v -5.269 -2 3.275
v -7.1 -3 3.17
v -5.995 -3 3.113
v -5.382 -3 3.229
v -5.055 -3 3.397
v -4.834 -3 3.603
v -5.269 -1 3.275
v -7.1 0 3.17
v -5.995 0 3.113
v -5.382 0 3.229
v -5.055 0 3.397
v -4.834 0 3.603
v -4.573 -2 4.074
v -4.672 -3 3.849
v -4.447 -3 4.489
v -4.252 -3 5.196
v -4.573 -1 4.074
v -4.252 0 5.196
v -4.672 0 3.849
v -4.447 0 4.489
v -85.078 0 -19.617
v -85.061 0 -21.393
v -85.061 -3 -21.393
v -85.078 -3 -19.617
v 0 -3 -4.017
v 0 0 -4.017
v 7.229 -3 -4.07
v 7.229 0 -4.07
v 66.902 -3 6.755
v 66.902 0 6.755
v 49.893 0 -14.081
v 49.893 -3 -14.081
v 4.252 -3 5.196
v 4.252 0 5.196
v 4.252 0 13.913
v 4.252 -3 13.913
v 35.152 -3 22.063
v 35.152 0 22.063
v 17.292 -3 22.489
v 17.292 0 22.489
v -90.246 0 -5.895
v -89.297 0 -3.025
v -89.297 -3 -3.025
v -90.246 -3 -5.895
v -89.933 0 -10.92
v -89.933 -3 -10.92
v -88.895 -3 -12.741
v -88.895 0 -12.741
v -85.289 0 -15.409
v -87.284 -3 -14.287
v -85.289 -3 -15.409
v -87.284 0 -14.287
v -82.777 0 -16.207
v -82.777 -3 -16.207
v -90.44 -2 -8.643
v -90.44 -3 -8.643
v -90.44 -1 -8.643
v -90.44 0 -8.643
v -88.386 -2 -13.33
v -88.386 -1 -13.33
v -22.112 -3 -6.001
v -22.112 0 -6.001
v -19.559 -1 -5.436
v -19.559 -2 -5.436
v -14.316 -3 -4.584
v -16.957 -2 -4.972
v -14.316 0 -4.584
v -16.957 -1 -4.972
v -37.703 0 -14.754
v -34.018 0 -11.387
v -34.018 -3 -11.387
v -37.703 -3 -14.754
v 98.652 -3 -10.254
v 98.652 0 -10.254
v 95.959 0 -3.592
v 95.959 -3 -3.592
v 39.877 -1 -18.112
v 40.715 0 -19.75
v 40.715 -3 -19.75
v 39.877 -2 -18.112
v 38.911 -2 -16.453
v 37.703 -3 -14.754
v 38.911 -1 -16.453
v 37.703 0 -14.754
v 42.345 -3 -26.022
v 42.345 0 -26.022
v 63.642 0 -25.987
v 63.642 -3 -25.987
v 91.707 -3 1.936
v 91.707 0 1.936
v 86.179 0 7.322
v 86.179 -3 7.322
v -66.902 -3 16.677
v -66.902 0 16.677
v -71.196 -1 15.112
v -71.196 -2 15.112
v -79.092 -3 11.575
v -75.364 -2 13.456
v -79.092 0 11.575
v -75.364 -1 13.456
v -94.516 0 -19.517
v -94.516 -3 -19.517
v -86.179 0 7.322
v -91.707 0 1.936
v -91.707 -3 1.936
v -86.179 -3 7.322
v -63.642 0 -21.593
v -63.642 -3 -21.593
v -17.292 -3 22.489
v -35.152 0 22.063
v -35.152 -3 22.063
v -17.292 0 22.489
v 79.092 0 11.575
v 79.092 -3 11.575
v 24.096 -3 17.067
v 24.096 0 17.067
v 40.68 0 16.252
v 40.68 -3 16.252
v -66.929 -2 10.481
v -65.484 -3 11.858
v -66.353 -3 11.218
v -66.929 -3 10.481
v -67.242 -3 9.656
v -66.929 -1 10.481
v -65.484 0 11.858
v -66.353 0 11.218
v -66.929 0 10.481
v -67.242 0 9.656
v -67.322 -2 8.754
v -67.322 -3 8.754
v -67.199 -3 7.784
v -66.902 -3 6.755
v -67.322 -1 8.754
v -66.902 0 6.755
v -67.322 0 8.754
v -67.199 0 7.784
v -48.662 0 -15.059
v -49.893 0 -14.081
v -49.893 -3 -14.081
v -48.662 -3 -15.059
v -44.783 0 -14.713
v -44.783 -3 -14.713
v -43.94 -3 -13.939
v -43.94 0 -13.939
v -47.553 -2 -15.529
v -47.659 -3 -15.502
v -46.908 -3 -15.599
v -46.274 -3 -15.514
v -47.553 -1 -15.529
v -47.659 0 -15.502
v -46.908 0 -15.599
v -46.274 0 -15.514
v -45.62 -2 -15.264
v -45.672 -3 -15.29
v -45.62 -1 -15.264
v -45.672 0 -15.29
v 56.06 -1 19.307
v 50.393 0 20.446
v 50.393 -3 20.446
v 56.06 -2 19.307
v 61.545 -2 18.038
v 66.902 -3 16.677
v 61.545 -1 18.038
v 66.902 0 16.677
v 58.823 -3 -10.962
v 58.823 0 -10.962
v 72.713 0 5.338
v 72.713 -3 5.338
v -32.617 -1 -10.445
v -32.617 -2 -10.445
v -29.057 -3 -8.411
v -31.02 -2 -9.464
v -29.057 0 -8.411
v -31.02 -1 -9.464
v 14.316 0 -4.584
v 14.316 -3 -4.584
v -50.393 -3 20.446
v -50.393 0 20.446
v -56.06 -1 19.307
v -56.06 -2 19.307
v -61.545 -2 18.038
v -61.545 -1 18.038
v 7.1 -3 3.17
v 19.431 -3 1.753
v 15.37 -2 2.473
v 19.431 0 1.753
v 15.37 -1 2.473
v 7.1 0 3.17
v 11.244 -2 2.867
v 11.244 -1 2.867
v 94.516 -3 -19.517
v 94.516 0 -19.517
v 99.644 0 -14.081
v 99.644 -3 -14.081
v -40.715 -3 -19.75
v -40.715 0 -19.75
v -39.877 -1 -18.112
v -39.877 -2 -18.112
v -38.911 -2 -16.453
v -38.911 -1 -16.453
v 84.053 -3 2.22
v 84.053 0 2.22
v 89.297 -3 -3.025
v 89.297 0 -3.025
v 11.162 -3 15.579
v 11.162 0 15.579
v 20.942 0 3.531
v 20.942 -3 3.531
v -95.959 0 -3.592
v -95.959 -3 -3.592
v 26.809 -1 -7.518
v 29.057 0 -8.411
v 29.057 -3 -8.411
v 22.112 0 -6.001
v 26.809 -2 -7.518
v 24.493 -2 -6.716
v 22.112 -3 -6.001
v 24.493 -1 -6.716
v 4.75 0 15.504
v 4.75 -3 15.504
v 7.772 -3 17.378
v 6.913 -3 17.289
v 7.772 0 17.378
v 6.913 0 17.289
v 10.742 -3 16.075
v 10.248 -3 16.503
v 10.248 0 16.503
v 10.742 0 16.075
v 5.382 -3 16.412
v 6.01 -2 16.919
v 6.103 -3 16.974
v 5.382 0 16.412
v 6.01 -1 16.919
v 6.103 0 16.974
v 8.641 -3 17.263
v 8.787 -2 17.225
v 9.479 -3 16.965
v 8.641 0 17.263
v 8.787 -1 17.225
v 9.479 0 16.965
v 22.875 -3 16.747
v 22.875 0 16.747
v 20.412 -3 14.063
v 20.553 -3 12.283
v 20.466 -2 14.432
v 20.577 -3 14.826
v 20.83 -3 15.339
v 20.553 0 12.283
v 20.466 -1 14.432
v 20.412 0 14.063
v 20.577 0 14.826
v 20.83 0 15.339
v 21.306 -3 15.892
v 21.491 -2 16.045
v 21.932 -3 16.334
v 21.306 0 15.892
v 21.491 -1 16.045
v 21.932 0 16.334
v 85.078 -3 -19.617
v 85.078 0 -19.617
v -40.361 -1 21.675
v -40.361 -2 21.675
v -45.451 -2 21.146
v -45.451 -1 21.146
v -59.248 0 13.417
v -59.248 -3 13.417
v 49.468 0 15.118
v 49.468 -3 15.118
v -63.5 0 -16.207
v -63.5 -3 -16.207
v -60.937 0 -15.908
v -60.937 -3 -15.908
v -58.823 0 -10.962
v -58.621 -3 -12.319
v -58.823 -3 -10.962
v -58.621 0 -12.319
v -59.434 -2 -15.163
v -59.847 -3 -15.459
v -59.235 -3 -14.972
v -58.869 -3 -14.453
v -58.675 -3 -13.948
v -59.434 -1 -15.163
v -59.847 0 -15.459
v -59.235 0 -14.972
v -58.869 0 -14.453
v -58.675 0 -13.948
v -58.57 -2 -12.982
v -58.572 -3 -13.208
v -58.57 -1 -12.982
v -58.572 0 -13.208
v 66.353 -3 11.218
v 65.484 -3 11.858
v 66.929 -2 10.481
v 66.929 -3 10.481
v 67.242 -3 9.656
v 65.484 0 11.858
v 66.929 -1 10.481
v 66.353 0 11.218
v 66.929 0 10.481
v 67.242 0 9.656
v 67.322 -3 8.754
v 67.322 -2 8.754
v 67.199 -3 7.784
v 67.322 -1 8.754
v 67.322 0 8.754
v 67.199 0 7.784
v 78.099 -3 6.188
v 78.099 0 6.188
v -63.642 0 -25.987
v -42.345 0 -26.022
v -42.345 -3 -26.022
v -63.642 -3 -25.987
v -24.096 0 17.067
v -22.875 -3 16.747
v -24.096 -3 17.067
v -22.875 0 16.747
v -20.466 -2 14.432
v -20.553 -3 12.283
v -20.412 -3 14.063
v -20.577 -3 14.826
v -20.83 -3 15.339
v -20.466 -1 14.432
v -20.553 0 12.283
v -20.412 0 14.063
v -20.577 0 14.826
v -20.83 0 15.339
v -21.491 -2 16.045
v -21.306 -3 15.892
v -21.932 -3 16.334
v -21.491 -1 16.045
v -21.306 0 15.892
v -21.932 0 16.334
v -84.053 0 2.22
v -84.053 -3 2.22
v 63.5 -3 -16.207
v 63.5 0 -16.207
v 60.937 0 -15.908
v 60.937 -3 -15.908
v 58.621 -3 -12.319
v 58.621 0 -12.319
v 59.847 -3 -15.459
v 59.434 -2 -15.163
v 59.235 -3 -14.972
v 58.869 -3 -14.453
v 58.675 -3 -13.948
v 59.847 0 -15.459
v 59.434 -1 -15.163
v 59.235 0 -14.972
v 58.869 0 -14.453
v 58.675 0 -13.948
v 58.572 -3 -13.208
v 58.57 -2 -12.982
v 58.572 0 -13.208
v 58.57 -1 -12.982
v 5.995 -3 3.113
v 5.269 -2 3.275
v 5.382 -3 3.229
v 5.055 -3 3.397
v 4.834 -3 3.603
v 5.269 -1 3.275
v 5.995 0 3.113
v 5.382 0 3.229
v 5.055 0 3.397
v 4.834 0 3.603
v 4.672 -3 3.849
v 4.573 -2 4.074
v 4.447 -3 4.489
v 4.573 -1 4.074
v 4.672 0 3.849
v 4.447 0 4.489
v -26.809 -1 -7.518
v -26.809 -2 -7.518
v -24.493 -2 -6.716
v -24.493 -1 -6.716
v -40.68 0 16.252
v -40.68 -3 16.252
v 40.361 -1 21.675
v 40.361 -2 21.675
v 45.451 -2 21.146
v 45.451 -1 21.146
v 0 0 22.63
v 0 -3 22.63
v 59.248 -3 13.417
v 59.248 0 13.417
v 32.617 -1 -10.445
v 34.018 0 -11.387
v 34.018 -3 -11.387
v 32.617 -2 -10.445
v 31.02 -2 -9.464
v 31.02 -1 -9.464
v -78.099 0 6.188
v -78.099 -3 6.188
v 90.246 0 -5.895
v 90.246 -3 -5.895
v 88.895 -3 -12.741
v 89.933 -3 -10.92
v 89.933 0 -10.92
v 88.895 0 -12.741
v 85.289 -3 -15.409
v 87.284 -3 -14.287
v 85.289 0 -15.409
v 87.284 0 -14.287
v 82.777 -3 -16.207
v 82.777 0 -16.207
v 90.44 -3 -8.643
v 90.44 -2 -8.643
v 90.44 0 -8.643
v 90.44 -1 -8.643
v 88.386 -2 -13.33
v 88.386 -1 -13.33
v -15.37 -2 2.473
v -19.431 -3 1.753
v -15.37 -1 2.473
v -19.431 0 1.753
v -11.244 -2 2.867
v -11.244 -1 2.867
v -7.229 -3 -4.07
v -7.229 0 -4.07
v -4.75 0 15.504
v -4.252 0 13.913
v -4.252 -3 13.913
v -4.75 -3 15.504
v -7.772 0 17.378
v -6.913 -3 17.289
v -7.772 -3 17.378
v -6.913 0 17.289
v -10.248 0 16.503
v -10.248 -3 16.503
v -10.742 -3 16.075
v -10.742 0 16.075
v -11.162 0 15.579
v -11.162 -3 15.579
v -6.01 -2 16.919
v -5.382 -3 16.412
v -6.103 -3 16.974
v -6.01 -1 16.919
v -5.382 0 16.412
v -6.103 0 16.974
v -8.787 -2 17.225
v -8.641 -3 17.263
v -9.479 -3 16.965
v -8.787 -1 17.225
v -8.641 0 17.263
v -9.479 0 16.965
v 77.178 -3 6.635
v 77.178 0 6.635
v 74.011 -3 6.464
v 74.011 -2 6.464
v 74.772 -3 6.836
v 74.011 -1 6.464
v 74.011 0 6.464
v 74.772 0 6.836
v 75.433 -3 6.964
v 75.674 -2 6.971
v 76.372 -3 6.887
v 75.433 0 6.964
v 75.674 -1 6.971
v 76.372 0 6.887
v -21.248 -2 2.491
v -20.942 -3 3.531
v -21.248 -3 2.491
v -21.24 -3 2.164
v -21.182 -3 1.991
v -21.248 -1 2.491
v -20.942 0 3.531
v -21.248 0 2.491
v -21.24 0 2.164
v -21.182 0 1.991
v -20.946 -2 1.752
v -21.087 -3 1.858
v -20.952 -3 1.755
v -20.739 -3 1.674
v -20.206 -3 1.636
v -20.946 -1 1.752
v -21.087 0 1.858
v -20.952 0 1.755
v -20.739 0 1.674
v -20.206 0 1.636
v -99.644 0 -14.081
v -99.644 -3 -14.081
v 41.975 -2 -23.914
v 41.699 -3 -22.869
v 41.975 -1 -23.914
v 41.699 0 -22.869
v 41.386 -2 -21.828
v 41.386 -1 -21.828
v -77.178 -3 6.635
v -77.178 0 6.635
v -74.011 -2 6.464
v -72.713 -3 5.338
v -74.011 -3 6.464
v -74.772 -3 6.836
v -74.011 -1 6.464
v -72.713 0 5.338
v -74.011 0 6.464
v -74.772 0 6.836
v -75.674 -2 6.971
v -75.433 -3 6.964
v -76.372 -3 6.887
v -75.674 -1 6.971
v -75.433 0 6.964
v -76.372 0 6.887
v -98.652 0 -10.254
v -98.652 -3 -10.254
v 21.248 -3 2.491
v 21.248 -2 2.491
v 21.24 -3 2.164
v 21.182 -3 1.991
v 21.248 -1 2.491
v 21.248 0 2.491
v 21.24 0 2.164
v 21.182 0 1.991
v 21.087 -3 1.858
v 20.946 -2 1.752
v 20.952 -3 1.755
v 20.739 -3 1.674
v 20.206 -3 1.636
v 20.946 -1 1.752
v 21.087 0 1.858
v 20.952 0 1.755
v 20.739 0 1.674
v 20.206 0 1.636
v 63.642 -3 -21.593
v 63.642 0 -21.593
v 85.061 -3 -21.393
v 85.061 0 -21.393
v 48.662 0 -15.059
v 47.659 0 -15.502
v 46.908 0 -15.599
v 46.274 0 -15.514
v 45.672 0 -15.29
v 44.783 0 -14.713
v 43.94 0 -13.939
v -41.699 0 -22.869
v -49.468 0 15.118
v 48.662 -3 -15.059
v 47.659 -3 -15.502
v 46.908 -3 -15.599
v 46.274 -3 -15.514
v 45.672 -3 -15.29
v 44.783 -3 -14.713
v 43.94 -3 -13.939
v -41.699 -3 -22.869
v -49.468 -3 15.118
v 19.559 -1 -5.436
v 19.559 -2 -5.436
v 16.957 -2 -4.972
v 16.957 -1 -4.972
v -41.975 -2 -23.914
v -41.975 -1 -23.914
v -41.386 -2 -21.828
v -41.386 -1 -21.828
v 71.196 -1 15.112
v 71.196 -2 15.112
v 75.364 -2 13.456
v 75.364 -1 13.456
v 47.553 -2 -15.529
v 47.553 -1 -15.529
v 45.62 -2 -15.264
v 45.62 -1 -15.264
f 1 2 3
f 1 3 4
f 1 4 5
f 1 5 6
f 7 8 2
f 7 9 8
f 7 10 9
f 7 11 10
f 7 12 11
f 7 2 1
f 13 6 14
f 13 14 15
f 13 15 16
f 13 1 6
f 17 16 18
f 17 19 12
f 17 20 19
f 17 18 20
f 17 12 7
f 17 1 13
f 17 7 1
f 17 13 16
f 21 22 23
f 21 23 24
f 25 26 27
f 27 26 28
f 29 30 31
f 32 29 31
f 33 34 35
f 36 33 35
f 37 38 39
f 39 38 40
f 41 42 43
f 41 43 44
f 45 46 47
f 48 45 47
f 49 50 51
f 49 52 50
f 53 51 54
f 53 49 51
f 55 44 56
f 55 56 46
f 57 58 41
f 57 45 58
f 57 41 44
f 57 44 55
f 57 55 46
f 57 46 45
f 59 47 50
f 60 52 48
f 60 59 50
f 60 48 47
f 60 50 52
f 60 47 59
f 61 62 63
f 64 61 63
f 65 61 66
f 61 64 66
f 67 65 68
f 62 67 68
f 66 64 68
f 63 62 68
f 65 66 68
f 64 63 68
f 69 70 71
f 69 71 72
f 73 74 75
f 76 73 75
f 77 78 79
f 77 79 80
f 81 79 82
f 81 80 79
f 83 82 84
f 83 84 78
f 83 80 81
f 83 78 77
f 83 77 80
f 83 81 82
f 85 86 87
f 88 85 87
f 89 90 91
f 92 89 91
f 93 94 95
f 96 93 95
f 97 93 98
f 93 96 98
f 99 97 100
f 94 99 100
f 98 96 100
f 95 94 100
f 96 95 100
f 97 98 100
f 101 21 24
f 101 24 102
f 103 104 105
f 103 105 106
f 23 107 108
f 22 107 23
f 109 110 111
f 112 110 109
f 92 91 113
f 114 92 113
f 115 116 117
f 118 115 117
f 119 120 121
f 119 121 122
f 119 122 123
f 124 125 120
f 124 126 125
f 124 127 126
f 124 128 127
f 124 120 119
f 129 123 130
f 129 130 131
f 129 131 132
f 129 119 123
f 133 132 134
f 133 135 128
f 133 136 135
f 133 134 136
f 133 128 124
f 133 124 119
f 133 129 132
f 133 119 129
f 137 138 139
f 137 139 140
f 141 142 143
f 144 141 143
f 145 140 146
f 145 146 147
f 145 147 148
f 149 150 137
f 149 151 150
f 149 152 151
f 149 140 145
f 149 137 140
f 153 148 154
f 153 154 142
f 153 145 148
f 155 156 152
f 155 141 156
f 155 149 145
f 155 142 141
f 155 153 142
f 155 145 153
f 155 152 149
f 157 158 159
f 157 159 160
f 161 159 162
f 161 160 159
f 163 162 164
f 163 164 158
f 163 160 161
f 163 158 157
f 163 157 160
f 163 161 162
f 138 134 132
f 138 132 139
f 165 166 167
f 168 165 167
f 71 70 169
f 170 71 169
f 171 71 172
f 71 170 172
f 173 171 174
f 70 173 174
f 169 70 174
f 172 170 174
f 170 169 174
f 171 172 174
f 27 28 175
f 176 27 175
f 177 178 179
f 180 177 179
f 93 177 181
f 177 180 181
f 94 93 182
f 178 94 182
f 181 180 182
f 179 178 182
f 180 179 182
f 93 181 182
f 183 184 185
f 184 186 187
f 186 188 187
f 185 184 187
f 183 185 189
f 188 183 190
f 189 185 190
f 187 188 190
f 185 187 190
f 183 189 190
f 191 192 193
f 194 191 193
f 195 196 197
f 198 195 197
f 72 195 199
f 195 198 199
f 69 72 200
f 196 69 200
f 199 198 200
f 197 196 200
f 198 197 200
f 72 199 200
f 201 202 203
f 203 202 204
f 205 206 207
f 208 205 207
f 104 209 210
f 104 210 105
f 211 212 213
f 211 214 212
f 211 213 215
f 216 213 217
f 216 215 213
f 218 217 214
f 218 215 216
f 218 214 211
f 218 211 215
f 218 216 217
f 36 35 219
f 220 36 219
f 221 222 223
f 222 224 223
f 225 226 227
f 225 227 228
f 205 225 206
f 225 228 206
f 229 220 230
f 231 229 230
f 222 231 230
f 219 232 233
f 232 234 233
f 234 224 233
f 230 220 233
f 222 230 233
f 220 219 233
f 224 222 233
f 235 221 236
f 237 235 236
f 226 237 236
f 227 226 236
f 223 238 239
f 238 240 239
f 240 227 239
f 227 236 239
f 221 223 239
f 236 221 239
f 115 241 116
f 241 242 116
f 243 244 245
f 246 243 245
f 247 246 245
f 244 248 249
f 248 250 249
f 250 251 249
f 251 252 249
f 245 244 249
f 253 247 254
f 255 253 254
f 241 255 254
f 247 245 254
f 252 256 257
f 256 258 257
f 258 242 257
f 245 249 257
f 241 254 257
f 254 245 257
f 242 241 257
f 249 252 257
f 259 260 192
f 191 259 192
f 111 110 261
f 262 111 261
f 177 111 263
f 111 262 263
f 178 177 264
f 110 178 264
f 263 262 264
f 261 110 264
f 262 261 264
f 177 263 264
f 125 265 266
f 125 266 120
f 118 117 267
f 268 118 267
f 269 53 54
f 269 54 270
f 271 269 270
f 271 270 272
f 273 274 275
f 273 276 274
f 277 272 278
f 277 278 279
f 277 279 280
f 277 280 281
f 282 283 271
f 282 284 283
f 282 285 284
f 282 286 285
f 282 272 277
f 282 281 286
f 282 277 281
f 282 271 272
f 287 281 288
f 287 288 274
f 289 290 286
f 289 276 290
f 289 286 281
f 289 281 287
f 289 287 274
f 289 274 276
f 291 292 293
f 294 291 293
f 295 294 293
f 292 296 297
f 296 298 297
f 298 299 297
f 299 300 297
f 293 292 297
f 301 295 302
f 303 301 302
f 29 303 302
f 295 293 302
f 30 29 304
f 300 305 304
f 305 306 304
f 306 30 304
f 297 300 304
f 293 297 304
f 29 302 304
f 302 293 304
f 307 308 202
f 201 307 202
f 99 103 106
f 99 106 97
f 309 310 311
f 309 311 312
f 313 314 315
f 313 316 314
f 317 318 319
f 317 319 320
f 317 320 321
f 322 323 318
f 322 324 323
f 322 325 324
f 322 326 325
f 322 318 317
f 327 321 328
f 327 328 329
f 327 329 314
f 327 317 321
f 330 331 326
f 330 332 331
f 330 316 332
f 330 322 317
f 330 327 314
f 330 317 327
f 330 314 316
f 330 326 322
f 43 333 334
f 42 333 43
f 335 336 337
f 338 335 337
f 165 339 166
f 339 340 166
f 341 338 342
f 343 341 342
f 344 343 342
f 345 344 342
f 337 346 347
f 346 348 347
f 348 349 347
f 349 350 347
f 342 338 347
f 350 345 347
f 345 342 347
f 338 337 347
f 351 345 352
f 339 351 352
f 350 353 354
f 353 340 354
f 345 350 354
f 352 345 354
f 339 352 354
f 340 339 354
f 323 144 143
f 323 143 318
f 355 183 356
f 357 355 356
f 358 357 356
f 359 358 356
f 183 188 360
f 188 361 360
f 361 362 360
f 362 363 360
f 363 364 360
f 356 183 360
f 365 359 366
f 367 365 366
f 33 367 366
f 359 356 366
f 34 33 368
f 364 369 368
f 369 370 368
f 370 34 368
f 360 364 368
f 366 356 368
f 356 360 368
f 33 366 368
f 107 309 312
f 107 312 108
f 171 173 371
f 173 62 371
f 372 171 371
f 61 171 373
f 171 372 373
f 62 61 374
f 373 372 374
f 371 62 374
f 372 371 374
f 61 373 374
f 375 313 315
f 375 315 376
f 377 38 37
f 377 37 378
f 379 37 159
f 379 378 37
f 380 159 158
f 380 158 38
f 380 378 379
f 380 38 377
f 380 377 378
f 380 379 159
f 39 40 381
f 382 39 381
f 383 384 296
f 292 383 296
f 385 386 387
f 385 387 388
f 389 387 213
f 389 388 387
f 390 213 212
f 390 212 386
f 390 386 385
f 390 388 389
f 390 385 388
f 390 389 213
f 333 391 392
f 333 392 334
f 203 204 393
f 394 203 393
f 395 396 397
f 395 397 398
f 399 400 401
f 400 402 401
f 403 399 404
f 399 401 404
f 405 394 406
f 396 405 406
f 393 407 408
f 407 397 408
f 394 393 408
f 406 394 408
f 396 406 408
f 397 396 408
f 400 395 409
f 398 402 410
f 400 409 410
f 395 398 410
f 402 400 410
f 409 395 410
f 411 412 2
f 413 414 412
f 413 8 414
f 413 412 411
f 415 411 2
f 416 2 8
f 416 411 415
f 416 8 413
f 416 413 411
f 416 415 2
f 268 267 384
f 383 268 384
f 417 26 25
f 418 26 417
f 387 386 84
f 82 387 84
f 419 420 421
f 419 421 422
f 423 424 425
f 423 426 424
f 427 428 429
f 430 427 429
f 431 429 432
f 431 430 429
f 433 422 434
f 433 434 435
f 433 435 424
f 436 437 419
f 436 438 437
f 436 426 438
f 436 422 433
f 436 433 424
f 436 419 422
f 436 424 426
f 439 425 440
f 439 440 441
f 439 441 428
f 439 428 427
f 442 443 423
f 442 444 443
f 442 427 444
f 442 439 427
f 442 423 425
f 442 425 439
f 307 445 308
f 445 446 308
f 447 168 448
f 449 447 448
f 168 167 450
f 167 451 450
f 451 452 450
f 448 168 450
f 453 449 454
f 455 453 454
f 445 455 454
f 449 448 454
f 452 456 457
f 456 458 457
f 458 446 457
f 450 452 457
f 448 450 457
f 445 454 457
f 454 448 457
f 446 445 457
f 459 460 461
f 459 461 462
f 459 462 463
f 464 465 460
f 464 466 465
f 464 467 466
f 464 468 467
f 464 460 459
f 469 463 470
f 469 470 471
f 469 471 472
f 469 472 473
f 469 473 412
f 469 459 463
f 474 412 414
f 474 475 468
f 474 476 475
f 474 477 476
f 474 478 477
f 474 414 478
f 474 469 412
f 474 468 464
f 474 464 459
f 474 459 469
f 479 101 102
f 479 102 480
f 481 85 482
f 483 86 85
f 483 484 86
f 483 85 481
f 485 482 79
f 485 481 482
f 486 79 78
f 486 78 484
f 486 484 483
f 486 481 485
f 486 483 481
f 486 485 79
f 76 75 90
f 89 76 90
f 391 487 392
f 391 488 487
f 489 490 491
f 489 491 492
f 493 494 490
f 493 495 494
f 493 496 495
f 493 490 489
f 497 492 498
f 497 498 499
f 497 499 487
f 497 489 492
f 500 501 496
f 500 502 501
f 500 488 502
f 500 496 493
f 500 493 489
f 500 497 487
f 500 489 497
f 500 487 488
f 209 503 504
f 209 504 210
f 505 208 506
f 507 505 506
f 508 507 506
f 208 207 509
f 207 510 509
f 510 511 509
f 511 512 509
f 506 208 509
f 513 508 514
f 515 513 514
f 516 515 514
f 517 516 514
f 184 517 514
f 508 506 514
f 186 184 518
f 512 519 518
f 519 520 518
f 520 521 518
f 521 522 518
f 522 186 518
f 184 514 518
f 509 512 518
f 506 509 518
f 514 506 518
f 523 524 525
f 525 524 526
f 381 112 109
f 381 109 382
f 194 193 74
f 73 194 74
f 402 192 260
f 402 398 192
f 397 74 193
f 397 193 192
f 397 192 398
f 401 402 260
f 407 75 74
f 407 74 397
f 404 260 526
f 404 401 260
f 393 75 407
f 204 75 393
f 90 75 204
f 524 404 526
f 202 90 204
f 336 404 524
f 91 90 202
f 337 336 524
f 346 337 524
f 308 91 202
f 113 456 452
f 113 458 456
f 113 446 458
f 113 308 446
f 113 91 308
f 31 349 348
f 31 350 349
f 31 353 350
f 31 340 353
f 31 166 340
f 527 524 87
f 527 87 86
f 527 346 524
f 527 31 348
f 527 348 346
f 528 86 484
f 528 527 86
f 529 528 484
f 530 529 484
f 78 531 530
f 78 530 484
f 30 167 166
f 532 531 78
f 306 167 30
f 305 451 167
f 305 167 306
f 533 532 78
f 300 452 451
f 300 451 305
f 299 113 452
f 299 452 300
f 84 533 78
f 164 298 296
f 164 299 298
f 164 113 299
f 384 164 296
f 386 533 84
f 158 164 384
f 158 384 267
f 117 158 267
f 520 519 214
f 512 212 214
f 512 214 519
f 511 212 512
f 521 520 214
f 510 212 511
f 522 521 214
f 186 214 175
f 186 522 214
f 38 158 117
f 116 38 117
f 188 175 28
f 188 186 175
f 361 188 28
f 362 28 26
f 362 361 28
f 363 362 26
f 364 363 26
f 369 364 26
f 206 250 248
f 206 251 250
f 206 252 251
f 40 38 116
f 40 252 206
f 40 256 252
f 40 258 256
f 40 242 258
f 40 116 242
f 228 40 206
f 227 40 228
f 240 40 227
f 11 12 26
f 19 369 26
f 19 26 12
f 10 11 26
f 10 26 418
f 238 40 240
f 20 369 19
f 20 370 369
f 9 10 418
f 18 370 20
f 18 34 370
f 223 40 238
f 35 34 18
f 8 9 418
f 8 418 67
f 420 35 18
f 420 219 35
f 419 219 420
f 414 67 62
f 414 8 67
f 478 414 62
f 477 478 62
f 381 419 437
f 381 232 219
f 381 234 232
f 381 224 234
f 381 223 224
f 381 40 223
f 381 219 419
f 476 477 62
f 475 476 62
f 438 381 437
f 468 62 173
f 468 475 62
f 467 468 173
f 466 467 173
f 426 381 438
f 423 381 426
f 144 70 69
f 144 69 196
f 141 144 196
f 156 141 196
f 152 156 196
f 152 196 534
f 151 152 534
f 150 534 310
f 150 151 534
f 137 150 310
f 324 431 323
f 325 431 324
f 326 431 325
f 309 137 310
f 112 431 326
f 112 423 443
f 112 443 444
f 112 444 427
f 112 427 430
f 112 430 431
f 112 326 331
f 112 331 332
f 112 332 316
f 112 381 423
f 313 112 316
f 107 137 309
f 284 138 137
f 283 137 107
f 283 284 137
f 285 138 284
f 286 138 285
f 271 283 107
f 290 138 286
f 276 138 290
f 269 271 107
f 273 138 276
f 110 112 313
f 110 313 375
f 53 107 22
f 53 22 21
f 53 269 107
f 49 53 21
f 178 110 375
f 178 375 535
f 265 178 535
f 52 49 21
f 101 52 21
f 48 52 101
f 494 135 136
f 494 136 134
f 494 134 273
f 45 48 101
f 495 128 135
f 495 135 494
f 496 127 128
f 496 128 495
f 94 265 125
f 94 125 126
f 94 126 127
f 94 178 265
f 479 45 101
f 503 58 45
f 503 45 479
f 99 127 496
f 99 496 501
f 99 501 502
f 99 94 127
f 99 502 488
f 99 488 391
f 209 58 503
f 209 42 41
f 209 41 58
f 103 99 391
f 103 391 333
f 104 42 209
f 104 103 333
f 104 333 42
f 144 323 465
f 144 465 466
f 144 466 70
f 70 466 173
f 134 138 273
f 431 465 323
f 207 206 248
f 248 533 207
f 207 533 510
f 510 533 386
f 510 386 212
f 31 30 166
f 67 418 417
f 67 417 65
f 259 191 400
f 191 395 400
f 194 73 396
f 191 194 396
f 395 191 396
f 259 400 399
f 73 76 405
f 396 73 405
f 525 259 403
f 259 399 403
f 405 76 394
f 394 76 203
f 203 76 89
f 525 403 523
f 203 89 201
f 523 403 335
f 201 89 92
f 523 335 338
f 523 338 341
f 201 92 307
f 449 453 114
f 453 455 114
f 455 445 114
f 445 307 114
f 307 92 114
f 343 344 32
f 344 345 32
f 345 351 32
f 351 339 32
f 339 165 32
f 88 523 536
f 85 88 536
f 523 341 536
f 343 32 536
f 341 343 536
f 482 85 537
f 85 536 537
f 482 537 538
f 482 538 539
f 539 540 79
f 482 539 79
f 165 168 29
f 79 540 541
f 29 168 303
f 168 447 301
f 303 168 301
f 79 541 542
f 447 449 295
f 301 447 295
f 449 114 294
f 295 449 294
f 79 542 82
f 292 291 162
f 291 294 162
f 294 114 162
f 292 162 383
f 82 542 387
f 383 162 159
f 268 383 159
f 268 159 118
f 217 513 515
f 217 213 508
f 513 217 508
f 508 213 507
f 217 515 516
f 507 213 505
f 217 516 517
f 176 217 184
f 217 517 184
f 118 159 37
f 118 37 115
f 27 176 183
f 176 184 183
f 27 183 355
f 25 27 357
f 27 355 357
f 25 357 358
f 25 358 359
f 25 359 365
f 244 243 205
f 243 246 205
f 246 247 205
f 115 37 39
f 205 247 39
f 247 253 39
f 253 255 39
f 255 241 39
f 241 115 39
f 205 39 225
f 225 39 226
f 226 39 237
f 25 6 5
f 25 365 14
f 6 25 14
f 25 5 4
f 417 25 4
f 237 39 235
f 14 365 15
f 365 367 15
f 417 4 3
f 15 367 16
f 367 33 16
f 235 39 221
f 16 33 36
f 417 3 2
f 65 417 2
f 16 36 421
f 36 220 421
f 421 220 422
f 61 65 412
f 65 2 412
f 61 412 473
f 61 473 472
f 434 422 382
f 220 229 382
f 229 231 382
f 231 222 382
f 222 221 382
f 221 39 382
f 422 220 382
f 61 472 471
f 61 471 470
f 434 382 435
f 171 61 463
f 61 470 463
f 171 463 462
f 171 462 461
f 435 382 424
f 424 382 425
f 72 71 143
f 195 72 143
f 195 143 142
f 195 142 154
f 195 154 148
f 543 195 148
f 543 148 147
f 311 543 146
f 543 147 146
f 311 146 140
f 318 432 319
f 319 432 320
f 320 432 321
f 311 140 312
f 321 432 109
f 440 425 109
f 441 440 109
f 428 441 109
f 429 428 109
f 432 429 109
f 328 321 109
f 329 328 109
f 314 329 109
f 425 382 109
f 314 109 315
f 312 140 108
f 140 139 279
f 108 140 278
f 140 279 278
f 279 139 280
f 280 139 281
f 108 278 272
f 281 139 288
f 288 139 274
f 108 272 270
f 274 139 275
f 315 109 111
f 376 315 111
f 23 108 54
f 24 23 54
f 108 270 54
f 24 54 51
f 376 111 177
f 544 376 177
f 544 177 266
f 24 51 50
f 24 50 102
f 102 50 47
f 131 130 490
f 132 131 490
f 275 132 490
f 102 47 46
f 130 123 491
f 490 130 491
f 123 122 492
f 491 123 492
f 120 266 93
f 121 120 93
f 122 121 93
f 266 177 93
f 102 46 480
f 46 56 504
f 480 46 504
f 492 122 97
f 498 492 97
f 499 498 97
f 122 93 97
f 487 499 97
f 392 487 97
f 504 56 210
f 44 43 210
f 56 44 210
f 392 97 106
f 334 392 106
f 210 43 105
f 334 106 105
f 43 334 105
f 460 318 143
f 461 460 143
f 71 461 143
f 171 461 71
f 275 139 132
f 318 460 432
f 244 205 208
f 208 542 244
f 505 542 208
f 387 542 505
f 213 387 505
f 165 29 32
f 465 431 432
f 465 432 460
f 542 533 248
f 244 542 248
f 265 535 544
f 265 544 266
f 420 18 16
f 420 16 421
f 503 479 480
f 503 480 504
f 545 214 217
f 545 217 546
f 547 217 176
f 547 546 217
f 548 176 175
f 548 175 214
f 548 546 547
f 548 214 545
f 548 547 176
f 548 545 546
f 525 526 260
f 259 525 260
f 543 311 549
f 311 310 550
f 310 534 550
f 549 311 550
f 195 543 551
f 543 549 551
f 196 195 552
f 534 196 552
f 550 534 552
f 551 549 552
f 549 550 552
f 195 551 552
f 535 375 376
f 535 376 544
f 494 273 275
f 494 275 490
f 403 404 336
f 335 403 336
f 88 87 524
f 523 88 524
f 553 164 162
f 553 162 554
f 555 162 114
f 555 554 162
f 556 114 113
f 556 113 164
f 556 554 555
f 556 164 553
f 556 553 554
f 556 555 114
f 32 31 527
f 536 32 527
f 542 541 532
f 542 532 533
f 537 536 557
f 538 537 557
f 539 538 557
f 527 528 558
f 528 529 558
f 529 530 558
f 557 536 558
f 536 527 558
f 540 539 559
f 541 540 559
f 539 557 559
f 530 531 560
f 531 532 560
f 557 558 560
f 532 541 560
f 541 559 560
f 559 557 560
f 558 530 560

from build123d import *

# Parameters (mm, degrees)
F1_DEPTH = 3


# Not quite as in the source:
# - ends of sketch curves that miss each other by under 0.0002 mm in the source are joined


with BuildPart() as f1:
    # F0 (on Front) → F1 (new body)
    with BuildSketch(Plane.XZ):
        with BuildLine():
            Line((17.292411, 22.4886673102), (0, 22.6303943102))
            Line((0, 22.6303943102), (0, -4.0168806898))
            Line((0, -4.0168806898), (7.228795, -4.0700556898))
            Line((7.228795, -4.0700556898), (14.3159177513, -4.5838576898))
            add(Edge.make_bspline(
                [(22.1116757513, -6.0012756898), (19.5885557513, -5.3778676898), (16.9721657513, -4.9410076898), (14.3159177513, -4.5838576898)],
                knots=[0, 0, 0, 0, 1, 1, 1, 1], degree=3))
            add(Edge.make_bspline(
                [(29.0569877513, -8.4108676898), (26.8431947513, -7.4725876898), (24.5259177513, -6.6722926898), (22.1116757513, -6.0012756898)],
                knots=[0, 0, 0, 0, 1, 1, 1, 1], degree=3))
            add(Edge.make_bspline(
                [(34.0179267513, -11.3874226898), (32.6589677513, -10.4530956898), (31.2598277513, -9.5108856898), (29.0569877513, -8.4108676898)],
                knots=[0, 0, 0, 0, 1, 1, 1, 1], degree=3))
            Line((34.0179267513, -11.3874226898), (37.7031947513, -14.7537826898))
            add(Edge.make_bspline(
                [(40.7151917513, -19.7501556898), (39.9025247513, -18.1165876898), (39.0710207513, -16.4798776898), (37.7031947513, -14.7537826898)],
                knots=[0, 0, 0, 0, 1, 1, 1, 1], degree=3))
            add(Edge.make_bspline(
                [(42.3452147513, -26.0221956898), (42.1316587513, -23.8985406898), (41.3798467513, -21.8287056898), (40.7151917513, -19.7501556898)],
                knots=[0, 0, 0, 0, 1, 1, 1, 1], degree=3))
            Line((42.3452147513, -26.0221956898), (63.6418097513, -25.9867956898))
            Line((63.6418097513, -25.9867956898), (63.6418097513, -21.5928156898))
            Line((63.6418097513, -21.5928156898), (85.0611677513, -21.3930906898))
            Line((85.0611677513, -21.3930906898), (85.0783427513, -19.6170306898))
            Line((85.0783427513, -19.6170306898), (94.5155407513, -19.5168076898))
            Line((94.5155407513, -19.5168076898), (99.6440177513, -14.0805456898))
            Line((99.6440177513, -14.0805456898), (98.6518277513, -10.2535206898))
            Line((98.6518277513, -10.2535206898), (95.9587507513, -3.5916906898))
            Line((95.9587507513, -3.5916906898), (91.7065207513, 1.9361993102))
            Line((91.7065207513, 1.9361993102), (86.1786157513, 7.3223693102))
            Line((86.1786157513, 7.3223693102), (79.0915657513, 11.5746073102))
            add(Edge.make_bspline(
                [(66.9018327513, 16.6772693102), (71.1556647513, 15.1125143102), (75.6872037513, 13.6136843102), (79.0915657513, 11.5746073102)],
                knots=[0, 0, 0, 0, 1, 1, 1, 1], degree=3))
            add(Edge.make_bspline(
                [(50.3932967513, 20.4463193102), (56.1680017513, 19.3841543102), (61.5919797513, 18.0714743102), (66.9018327513, 16.6772693102)],
                knots=[0, 0, 0, 0, 1, 1, 1, 1], degree=3))
            add(Edge.make_bspline(
                [(35.1518327513, 22.0634393102), (40.4118917513, 21.7338963102), (45.5332607513, 21.2425493102), (50.3932967513, 20.4463193102)],
                knots=[0, 0, 0, 0, 1, 1, 1, 1], degree=3))
            Line((35.1518327513, 22.0634393102), (17.292411, 22.4886673102))
        make_face()
        with BuildLine():
            add(Edge.make_bspline(
                [(72.7132127513, 5.3379973102), (73.9598487513, 6.5501393102), (75.1615877513, 7.8382423102), (78.0993757513, 6.1884373102)],
                knots=[0, 0, 0, 0, 1, 1, 1, 1], degree=3))
            Line((78.0993757513, 6.1884373102), (84.0525007513, 2.2196843102))
            Line((84.0525007513, 2.2196843102), (89.2969207513, -3.0247356898))
            add(Edge.make_bspline(
                [(89.2969207513, -3.0247356898), (91.9198887513, -8.8158756898), (90.2818957513, -14.5270806898), (82.7768327513, -16.2066456898)],
                knots=[0, 0, 0, 0, 1, 1, 1, 1], degree=3))
            Line((82.7768327513, -16.2066456898), (63.5000457513, -16.2066456898))
            add(Edge.make_bspline(
                [(63.5000457513, -16.2066456898), (57.1380727513, -16.1648706898), (58.7067867513, -12.4673406898), (58.8225907513, -10.9622406898)],
                knots=[0, 0, 0, 0, 1, 1, 1, 1], degree=3))
            Line((58.8225907513, -10.9622406898), (72.7132127513, 5.3379973102))
        make_face(mode=Mode.SUBTRACT)
        with BuildLine():
            add(Edge.make_bspline(
                [(4.2522797513, 13.9133163102), (5.0251887513, 18.5193293102), (9.4633147513, 17.9503943102), (11.1621567513, 15.5787743102)],
                knots=[0, 0, 0, 0, 1, 1, 1, 1], degree=3))
            Line((11.1621567513, 15.5787743102), (20.9422897513, 3.5307823102))
            add(Edge.make_bspline(
                [(20.9422897513, 3.5307823102), (21.3510167513, 2.4878923102), (21.7530967513, 1.2352573102), (19.4311007513, 1.7529523102)],
                knots=[0, 0, 0, 0, 1, 1, 1, 1], degree=3))
            add(Edge.make_bspline(
                [(19.4311007513, 1.7529523102), (15.4182557513, 2.7136493102), (11.2374477513, 2.8345273102), (7.0996287513, 3.1703543102)],
                knots=[0, 0, 0, 0, 1, 1, 1, 1], degree=3))
            add(Edge.make_bspline(
                [(7.0996287513, 3.1703543102), (4.4484227513, 2.8037243102), (4.6391687513, 4.0357343102), (4.2522797513, 5.1962473102)],
                knots=[0, 0, 0, 0, 1, 1, 1, 1], degree=3))
            Line((4.2522797513, 5.1962473102), (4.2522797513, 13.9133163102))
        make_face(mode=Mode.SUBTRACT)
        with BuildLine():
            add(Edge.make_bspline(
                [(20.5525017513, 12.2833043102), (20.0676617513, 14.6816013102), (20.5440417513, 16.3586093102), (24.0960287513, 17.0670743102)],
                knots=[0, 0, 0, 0, 1, 1, 1, 1], degree=3))
            Line((24.0960287513, 17.0670743102), (40.6797337513, 16.2520573102))
            Line((40.6797337513, 16.2520573102), (49.4676807513, 15.1181243102))
            Line((49.4676807513, 15.1181243102), (59.2478147513, 13.4172363102))
            Line((59.2478147513, 13.4172363102), (65.4844207513, 11.8580763102))
            add(Edge.make_bspline(
                [(65.4844207513, 11.8580763102), (67.5337397513, 10.6827963102), (67.6491757513, 8.8628913102), (66.9018317513, 6.7553913102)],
                knots=[0, 0, 0, 0, 1, 1, 1, 1], degree=3))
            Line((66.9018317513, 6.7553913102), (49.8929027513, -14.0805456898))
            add(Edge.make_bspline(
                [(49.8929027513, -14.0805456898), (47.2968437513, -16.6023676898), (45.5455047513, -15.5763756898), (43.9397777513, -13.9388026898)],
                knots=[0, 0, 0, 0, 1, 1, 1, 1], degree=3))
            Line((43.9397777513, -13.9388026898), (20.5525017513, 12.2833043102))
        make_face(mode=Mode.SUBTRACT)
    extrude(amount=F1_DEPTH)

    # F2: F1 across plane


with BuildPart() as f1_1:
    add(f1.part)
    add(f1.part.mirror(Plane.YZ))


solid = f1_1.part
